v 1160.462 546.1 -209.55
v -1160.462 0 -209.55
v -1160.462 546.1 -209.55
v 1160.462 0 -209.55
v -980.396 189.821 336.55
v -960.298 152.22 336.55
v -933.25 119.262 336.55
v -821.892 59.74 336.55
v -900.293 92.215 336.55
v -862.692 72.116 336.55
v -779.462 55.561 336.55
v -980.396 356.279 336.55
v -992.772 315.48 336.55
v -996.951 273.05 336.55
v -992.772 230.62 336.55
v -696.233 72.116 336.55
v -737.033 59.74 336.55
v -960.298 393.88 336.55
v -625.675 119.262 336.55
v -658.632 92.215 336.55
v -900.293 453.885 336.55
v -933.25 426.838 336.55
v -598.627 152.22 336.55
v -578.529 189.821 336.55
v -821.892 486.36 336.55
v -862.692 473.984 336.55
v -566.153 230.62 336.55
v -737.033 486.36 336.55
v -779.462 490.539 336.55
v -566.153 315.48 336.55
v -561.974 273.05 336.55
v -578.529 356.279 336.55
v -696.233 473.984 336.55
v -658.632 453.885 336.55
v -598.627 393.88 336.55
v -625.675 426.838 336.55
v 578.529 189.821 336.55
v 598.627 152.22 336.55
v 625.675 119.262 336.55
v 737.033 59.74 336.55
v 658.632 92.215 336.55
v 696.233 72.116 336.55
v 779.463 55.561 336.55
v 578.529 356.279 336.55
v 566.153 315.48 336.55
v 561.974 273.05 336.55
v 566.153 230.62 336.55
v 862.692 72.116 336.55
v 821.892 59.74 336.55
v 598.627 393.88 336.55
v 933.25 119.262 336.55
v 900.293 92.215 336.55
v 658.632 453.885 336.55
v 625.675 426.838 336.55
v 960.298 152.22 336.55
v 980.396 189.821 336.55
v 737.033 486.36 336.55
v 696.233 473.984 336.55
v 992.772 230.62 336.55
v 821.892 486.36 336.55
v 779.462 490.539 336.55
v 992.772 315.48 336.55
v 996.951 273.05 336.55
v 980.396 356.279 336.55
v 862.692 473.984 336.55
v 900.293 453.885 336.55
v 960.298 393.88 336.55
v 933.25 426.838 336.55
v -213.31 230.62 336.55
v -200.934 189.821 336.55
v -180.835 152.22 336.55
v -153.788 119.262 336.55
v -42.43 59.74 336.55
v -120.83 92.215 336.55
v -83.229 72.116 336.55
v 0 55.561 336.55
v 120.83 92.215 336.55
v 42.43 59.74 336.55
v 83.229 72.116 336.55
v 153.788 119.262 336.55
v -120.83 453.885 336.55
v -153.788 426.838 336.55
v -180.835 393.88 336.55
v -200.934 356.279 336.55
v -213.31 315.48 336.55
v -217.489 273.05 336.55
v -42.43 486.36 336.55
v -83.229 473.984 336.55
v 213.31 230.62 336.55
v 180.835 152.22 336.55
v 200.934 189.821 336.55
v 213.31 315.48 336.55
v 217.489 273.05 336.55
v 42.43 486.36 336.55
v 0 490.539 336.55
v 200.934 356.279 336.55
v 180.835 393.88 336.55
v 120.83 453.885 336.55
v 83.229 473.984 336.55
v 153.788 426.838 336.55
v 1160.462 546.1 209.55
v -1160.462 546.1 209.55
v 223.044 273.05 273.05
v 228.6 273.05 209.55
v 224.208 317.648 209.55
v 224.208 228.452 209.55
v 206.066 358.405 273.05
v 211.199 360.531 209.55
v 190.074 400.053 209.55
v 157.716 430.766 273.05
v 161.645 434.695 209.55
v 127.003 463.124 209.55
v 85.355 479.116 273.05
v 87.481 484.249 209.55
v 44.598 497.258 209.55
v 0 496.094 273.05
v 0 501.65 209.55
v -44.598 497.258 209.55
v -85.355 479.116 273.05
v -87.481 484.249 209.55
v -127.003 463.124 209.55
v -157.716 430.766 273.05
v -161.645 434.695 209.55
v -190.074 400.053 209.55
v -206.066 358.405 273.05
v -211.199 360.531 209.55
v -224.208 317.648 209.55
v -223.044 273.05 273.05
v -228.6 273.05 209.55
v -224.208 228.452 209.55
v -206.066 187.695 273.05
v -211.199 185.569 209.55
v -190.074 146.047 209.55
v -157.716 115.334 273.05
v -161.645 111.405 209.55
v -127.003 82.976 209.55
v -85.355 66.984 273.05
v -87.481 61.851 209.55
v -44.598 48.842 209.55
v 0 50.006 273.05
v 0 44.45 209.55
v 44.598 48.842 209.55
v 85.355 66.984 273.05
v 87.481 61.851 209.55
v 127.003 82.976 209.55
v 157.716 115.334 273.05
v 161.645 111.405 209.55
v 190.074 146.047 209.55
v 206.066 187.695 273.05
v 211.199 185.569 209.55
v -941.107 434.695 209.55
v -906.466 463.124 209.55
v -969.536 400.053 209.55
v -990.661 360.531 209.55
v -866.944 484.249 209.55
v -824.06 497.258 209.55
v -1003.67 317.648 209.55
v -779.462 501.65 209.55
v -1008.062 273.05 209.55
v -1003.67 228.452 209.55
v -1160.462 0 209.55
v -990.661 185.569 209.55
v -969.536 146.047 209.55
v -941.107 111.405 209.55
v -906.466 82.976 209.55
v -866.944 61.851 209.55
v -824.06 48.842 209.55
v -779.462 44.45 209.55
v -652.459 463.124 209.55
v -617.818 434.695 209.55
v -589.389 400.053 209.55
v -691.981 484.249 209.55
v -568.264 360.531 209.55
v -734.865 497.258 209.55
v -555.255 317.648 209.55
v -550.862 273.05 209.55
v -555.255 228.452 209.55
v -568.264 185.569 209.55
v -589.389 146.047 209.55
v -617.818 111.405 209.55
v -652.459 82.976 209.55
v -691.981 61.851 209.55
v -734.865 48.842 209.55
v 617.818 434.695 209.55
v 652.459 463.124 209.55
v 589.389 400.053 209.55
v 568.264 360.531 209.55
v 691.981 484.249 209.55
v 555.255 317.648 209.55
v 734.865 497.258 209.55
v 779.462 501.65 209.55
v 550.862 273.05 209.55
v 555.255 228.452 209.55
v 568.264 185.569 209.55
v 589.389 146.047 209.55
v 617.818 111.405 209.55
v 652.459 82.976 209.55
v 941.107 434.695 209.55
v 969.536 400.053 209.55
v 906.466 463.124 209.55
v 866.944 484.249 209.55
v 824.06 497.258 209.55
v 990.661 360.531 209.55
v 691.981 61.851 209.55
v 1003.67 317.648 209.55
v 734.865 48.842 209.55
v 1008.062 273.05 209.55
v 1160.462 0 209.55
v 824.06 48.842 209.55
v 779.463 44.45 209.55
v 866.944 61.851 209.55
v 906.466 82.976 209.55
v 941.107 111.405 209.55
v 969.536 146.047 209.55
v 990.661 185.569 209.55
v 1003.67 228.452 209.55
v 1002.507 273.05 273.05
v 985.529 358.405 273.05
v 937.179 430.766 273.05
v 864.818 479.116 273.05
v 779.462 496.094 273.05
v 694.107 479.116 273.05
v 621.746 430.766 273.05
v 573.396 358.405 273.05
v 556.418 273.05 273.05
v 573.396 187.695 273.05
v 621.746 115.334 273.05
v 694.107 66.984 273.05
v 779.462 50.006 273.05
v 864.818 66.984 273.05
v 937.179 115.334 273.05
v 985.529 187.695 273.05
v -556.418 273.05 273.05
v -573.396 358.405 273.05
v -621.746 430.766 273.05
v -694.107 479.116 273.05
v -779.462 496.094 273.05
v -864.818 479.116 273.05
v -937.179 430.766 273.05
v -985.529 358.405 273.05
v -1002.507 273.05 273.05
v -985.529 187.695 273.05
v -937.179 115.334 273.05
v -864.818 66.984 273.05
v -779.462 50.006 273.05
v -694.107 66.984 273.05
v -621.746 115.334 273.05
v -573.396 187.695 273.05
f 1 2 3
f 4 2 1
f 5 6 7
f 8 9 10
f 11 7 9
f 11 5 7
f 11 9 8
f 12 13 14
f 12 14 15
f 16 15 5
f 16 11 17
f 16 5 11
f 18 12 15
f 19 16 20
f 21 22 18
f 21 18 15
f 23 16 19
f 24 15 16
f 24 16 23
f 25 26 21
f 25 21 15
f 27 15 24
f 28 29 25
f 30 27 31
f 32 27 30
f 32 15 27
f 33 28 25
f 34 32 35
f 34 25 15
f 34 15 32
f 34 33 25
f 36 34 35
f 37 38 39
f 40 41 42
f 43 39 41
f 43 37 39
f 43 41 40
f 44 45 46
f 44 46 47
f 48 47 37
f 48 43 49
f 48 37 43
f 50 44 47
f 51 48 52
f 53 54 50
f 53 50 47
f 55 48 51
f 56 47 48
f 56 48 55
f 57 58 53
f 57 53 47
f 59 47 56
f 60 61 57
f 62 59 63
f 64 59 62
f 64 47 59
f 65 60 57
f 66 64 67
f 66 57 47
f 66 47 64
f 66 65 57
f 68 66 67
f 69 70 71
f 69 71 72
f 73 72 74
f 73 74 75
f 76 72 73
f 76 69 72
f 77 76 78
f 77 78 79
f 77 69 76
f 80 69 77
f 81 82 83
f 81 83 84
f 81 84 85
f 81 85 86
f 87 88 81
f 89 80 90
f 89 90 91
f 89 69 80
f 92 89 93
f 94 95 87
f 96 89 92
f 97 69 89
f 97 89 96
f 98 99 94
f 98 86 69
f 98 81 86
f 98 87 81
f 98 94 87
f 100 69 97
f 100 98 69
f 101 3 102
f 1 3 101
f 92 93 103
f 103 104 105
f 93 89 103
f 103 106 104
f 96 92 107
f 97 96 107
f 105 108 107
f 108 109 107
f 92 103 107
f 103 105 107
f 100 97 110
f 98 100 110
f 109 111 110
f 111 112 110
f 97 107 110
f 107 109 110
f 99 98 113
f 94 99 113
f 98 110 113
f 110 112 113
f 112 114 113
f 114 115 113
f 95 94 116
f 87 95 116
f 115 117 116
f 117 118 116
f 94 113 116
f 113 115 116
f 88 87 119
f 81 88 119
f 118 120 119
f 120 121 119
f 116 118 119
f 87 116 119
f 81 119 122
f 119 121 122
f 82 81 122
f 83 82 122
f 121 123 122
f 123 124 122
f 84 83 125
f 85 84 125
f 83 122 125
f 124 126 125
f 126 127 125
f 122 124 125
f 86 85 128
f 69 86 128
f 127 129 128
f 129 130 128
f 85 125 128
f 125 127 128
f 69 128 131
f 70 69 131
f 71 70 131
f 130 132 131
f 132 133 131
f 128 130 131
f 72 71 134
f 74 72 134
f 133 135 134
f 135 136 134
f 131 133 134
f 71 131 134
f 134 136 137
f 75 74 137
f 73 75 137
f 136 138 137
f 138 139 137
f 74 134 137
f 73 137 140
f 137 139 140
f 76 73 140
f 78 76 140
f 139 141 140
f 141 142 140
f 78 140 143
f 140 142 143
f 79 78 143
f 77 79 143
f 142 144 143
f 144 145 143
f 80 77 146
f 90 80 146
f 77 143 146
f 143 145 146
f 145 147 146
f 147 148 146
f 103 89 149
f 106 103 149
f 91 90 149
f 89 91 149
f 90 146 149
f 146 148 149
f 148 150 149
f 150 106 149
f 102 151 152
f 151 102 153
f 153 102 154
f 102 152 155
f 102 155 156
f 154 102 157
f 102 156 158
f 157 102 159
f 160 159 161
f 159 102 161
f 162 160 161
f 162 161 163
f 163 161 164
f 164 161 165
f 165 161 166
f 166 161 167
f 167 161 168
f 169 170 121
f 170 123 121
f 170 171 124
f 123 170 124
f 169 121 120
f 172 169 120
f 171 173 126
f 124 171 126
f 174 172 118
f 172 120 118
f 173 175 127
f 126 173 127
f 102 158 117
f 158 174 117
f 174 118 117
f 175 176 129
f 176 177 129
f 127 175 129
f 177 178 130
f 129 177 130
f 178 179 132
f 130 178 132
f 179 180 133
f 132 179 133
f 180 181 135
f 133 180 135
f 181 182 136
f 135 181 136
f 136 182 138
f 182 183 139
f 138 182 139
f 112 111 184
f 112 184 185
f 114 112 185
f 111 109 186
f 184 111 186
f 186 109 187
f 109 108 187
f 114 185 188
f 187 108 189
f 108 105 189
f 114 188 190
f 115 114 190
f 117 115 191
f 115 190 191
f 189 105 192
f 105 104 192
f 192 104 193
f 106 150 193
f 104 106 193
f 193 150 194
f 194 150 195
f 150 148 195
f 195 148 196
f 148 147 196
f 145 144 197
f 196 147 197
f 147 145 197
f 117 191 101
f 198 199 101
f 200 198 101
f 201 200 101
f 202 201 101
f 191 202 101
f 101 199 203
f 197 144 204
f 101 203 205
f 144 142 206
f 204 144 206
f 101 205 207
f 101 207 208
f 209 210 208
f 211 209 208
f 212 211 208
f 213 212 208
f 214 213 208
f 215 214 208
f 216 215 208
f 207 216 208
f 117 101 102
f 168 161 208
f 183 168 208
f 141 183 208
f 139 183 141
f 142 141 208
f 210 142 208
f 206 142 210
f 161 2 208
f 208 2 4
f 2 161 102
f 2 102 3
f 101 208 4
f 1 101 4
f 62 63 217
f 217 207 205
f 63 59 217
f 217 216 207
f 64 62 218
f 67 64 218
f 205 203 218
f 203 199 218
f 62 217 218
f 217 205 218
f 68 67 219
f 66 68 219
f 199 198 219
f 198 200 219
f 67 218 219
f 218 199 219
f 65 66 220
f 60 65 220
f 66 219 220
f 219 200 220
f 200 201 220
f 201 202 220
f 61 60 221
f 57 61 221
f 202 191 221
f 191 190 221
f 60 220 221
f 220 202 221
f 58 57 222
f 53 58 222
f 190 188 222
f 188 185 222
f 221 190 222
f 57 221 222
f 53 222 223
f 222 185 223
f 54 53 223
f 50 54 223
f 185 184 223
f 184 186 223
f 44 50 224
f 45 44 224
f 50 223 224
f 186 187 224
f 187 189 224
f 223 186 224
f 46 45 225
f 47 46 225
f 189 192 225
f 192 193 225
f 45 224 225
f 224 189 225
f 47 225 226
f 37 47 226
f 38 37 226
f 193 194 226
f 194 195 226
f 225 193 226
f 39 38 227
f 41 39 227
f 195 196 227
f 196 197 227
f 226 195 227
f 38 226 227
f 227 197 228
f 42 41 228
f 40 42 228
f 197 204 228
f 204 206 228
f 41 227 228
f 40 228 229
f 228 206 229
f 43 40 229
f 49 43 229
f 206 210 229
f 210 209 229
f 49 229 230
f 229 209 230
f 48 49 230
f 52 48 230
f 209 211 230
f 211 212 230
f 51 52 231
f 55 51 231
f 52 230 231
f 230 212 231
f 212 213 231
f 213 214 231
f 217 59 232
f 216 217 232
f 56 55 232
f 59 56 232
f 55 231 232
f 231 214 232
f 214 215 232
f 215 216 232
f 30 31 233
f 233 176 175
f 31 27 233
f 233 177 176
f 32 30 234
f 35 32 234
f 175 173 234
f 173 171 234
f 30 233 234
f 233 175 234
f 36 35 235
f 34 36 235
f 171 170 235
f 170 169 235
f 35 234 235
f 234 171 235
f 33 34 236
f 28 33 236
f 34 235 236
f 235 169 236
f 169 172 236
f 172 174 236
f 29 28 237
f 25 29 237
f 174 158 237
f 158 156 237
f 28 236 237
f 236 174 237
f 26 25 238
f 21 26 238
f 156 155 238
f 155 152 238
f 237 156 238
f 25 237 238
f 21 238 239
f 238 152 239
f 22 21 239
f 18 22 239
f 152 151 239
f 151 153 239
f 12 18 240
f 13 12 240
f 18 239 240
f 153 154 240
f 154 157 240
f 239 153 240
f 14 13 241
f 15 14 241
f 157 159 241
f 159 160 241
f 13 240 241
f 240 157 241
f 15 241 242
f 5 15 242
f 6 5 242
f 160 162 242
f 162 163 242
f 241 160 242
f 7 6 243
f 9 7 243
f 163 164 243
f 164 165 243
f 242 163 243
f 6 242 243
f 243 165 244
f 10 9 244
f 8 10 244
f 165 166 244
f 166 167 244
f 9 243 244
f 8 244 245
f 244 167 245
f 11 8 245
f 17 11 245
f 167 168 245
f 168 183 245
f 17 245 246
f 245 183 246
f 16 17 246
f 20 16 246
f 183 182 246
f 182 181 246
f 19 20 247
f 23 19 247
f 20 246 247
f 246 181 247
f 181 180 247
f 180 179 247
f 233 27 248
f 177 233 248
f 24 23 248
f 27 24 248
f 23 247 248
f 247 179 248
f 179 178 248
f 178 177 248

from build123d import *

# Parameters (mm, degrees)
SKETCH1_W                     = 2320.925
SKETCH1_H                     = 419.1
BOSS_EXTRUDE1_DEPTH           = 546.1
SKETCH2_R                     = 228.6
BOSS_EXTRUDE2_DEPTH           = 127
BOSS_EXTRUDE2_DRAFT           = 5
BOSS_EXTRUDE2_PROFILE_2_DEPTH = 127
BOSS_EXTRUDE2_PROFILE_2_DRAFT = 5
BOSS_EXTRUDE2_PROFILE_3_DEPTH = 127
BOSS_EXTRUDE2_PROFILE_3_DRAFT = 5


with BuildPart() as part:
    # Sketch1 → Boss-Extrude1 (new body)
    with BuildSketch(Plane(origin=(0, 0, 0), x_dir=(1, 0, 0), z_dir=(0, 1, 0))):
        Rectangle(SKETCH1_W, SKETCH1_H)
    extrude(amount=BOSS_EXTRUDE1_DEPTH)


with BuildPart() as boss_extrude2_tool:
    # Sketch2 → Boss-Extrude2 (with draft: the straight prism first)
    with BuildSketch(Plane.XY.offset(209.55)):
        with Locations((0, 273.05)):
            Circle(SKETCH2_R)
    extrude(amount=BOSS_EXTRUDE2_DEPTH)
    # Boss-Extrude2: the draft: its side faces are tilted about the plane it starts from
    boss_extrude2_sides = [boss_extrude2_tool.faces().sort_by_distance(p)[0] for p in [
        (-228.6, 273.05, 273.05),
    ]]
    draft(boss_extrude2_sides, Plane.XY.offset(209.55), BOSS_EXTRUDE2_DRAFT)


with BuildPart() as part_1:
    add(part.part)

    # Boss-Extrude2: add boss_extrude2_tool
    add(boss_extrude2_tool.part)


with BuildPart() as boss_extrude2_profile_2_tool:
    # Sketch2 → Boss-Extrude2 profile 2 (with draft: the straight prism first)
    with BuildSketch(Plane.XY.offset(209.55)):
        with Locations((779.4625, 273.05)):
            Circle(SKETCH2_R)
    extrude(amount=BOSS_EXTRUDE2_PROFILE_2_DEPTH)
    # Boss-Extrude2 profile 2: the draft: its side faces are tilted about the plane it starts from
    boss_extrude2_profile_2_sides = [boss_extrude2_profile_2_tool.faces().sort_by_distance(p)[0] for p in [
        (550.8625, 273.05, 273.05),
    ]]
    draft(boss_extrude2_profile_2_sides, Plane.XY.offset(209.55), BOSS_EXTRUDE2_PROFILE_2_DRAFT)


with BuildPart() as part_2:
    add(part_1.part)

    # Boss-Extrude2 profile 2: add boss_extrude2_profile_2_tool
    add(boss_extrude2_profile_2_tool.part)


with BuildPart() as boss_extrude2_profile_3_tool:
    # Sketch2 → Boss-Extrude2 profile 3 (with draft: the straight prism first)
    with BuildSketch(Plane.XY.offset(209.55)):
        with Locations((-779.4625, 273.05)):
            Circle(SKETCH2_R)
    extrude(amount=BOSS_EXTRUDE2_PROFILE_3_DEPTH)
    # Boss-Extrude2 profile 3: the draft: its side faces are tilted about the plane it starts from
    boss_extrude2_profile_3_sides = [boss_extrude2_profile_3_tool.faces().sort_by_distance(p)[0] for p in [
        (-1008.0625, 273.05, 273.05),
    ]]
    draft(boss_extrude2_profile_3_sides, Plane.XY.offset(209.55), BOSS_EXTRUDE2_PROFILE_3_DRAFT)


with BuildPart() as part_3:
    add(part_2.part)

    # Boss-Extrude2 profile 3: add boss_extrude2_profile_3_tool
    add(boss_extrude2_profile_3_tool.part)


solid = part_3.part
